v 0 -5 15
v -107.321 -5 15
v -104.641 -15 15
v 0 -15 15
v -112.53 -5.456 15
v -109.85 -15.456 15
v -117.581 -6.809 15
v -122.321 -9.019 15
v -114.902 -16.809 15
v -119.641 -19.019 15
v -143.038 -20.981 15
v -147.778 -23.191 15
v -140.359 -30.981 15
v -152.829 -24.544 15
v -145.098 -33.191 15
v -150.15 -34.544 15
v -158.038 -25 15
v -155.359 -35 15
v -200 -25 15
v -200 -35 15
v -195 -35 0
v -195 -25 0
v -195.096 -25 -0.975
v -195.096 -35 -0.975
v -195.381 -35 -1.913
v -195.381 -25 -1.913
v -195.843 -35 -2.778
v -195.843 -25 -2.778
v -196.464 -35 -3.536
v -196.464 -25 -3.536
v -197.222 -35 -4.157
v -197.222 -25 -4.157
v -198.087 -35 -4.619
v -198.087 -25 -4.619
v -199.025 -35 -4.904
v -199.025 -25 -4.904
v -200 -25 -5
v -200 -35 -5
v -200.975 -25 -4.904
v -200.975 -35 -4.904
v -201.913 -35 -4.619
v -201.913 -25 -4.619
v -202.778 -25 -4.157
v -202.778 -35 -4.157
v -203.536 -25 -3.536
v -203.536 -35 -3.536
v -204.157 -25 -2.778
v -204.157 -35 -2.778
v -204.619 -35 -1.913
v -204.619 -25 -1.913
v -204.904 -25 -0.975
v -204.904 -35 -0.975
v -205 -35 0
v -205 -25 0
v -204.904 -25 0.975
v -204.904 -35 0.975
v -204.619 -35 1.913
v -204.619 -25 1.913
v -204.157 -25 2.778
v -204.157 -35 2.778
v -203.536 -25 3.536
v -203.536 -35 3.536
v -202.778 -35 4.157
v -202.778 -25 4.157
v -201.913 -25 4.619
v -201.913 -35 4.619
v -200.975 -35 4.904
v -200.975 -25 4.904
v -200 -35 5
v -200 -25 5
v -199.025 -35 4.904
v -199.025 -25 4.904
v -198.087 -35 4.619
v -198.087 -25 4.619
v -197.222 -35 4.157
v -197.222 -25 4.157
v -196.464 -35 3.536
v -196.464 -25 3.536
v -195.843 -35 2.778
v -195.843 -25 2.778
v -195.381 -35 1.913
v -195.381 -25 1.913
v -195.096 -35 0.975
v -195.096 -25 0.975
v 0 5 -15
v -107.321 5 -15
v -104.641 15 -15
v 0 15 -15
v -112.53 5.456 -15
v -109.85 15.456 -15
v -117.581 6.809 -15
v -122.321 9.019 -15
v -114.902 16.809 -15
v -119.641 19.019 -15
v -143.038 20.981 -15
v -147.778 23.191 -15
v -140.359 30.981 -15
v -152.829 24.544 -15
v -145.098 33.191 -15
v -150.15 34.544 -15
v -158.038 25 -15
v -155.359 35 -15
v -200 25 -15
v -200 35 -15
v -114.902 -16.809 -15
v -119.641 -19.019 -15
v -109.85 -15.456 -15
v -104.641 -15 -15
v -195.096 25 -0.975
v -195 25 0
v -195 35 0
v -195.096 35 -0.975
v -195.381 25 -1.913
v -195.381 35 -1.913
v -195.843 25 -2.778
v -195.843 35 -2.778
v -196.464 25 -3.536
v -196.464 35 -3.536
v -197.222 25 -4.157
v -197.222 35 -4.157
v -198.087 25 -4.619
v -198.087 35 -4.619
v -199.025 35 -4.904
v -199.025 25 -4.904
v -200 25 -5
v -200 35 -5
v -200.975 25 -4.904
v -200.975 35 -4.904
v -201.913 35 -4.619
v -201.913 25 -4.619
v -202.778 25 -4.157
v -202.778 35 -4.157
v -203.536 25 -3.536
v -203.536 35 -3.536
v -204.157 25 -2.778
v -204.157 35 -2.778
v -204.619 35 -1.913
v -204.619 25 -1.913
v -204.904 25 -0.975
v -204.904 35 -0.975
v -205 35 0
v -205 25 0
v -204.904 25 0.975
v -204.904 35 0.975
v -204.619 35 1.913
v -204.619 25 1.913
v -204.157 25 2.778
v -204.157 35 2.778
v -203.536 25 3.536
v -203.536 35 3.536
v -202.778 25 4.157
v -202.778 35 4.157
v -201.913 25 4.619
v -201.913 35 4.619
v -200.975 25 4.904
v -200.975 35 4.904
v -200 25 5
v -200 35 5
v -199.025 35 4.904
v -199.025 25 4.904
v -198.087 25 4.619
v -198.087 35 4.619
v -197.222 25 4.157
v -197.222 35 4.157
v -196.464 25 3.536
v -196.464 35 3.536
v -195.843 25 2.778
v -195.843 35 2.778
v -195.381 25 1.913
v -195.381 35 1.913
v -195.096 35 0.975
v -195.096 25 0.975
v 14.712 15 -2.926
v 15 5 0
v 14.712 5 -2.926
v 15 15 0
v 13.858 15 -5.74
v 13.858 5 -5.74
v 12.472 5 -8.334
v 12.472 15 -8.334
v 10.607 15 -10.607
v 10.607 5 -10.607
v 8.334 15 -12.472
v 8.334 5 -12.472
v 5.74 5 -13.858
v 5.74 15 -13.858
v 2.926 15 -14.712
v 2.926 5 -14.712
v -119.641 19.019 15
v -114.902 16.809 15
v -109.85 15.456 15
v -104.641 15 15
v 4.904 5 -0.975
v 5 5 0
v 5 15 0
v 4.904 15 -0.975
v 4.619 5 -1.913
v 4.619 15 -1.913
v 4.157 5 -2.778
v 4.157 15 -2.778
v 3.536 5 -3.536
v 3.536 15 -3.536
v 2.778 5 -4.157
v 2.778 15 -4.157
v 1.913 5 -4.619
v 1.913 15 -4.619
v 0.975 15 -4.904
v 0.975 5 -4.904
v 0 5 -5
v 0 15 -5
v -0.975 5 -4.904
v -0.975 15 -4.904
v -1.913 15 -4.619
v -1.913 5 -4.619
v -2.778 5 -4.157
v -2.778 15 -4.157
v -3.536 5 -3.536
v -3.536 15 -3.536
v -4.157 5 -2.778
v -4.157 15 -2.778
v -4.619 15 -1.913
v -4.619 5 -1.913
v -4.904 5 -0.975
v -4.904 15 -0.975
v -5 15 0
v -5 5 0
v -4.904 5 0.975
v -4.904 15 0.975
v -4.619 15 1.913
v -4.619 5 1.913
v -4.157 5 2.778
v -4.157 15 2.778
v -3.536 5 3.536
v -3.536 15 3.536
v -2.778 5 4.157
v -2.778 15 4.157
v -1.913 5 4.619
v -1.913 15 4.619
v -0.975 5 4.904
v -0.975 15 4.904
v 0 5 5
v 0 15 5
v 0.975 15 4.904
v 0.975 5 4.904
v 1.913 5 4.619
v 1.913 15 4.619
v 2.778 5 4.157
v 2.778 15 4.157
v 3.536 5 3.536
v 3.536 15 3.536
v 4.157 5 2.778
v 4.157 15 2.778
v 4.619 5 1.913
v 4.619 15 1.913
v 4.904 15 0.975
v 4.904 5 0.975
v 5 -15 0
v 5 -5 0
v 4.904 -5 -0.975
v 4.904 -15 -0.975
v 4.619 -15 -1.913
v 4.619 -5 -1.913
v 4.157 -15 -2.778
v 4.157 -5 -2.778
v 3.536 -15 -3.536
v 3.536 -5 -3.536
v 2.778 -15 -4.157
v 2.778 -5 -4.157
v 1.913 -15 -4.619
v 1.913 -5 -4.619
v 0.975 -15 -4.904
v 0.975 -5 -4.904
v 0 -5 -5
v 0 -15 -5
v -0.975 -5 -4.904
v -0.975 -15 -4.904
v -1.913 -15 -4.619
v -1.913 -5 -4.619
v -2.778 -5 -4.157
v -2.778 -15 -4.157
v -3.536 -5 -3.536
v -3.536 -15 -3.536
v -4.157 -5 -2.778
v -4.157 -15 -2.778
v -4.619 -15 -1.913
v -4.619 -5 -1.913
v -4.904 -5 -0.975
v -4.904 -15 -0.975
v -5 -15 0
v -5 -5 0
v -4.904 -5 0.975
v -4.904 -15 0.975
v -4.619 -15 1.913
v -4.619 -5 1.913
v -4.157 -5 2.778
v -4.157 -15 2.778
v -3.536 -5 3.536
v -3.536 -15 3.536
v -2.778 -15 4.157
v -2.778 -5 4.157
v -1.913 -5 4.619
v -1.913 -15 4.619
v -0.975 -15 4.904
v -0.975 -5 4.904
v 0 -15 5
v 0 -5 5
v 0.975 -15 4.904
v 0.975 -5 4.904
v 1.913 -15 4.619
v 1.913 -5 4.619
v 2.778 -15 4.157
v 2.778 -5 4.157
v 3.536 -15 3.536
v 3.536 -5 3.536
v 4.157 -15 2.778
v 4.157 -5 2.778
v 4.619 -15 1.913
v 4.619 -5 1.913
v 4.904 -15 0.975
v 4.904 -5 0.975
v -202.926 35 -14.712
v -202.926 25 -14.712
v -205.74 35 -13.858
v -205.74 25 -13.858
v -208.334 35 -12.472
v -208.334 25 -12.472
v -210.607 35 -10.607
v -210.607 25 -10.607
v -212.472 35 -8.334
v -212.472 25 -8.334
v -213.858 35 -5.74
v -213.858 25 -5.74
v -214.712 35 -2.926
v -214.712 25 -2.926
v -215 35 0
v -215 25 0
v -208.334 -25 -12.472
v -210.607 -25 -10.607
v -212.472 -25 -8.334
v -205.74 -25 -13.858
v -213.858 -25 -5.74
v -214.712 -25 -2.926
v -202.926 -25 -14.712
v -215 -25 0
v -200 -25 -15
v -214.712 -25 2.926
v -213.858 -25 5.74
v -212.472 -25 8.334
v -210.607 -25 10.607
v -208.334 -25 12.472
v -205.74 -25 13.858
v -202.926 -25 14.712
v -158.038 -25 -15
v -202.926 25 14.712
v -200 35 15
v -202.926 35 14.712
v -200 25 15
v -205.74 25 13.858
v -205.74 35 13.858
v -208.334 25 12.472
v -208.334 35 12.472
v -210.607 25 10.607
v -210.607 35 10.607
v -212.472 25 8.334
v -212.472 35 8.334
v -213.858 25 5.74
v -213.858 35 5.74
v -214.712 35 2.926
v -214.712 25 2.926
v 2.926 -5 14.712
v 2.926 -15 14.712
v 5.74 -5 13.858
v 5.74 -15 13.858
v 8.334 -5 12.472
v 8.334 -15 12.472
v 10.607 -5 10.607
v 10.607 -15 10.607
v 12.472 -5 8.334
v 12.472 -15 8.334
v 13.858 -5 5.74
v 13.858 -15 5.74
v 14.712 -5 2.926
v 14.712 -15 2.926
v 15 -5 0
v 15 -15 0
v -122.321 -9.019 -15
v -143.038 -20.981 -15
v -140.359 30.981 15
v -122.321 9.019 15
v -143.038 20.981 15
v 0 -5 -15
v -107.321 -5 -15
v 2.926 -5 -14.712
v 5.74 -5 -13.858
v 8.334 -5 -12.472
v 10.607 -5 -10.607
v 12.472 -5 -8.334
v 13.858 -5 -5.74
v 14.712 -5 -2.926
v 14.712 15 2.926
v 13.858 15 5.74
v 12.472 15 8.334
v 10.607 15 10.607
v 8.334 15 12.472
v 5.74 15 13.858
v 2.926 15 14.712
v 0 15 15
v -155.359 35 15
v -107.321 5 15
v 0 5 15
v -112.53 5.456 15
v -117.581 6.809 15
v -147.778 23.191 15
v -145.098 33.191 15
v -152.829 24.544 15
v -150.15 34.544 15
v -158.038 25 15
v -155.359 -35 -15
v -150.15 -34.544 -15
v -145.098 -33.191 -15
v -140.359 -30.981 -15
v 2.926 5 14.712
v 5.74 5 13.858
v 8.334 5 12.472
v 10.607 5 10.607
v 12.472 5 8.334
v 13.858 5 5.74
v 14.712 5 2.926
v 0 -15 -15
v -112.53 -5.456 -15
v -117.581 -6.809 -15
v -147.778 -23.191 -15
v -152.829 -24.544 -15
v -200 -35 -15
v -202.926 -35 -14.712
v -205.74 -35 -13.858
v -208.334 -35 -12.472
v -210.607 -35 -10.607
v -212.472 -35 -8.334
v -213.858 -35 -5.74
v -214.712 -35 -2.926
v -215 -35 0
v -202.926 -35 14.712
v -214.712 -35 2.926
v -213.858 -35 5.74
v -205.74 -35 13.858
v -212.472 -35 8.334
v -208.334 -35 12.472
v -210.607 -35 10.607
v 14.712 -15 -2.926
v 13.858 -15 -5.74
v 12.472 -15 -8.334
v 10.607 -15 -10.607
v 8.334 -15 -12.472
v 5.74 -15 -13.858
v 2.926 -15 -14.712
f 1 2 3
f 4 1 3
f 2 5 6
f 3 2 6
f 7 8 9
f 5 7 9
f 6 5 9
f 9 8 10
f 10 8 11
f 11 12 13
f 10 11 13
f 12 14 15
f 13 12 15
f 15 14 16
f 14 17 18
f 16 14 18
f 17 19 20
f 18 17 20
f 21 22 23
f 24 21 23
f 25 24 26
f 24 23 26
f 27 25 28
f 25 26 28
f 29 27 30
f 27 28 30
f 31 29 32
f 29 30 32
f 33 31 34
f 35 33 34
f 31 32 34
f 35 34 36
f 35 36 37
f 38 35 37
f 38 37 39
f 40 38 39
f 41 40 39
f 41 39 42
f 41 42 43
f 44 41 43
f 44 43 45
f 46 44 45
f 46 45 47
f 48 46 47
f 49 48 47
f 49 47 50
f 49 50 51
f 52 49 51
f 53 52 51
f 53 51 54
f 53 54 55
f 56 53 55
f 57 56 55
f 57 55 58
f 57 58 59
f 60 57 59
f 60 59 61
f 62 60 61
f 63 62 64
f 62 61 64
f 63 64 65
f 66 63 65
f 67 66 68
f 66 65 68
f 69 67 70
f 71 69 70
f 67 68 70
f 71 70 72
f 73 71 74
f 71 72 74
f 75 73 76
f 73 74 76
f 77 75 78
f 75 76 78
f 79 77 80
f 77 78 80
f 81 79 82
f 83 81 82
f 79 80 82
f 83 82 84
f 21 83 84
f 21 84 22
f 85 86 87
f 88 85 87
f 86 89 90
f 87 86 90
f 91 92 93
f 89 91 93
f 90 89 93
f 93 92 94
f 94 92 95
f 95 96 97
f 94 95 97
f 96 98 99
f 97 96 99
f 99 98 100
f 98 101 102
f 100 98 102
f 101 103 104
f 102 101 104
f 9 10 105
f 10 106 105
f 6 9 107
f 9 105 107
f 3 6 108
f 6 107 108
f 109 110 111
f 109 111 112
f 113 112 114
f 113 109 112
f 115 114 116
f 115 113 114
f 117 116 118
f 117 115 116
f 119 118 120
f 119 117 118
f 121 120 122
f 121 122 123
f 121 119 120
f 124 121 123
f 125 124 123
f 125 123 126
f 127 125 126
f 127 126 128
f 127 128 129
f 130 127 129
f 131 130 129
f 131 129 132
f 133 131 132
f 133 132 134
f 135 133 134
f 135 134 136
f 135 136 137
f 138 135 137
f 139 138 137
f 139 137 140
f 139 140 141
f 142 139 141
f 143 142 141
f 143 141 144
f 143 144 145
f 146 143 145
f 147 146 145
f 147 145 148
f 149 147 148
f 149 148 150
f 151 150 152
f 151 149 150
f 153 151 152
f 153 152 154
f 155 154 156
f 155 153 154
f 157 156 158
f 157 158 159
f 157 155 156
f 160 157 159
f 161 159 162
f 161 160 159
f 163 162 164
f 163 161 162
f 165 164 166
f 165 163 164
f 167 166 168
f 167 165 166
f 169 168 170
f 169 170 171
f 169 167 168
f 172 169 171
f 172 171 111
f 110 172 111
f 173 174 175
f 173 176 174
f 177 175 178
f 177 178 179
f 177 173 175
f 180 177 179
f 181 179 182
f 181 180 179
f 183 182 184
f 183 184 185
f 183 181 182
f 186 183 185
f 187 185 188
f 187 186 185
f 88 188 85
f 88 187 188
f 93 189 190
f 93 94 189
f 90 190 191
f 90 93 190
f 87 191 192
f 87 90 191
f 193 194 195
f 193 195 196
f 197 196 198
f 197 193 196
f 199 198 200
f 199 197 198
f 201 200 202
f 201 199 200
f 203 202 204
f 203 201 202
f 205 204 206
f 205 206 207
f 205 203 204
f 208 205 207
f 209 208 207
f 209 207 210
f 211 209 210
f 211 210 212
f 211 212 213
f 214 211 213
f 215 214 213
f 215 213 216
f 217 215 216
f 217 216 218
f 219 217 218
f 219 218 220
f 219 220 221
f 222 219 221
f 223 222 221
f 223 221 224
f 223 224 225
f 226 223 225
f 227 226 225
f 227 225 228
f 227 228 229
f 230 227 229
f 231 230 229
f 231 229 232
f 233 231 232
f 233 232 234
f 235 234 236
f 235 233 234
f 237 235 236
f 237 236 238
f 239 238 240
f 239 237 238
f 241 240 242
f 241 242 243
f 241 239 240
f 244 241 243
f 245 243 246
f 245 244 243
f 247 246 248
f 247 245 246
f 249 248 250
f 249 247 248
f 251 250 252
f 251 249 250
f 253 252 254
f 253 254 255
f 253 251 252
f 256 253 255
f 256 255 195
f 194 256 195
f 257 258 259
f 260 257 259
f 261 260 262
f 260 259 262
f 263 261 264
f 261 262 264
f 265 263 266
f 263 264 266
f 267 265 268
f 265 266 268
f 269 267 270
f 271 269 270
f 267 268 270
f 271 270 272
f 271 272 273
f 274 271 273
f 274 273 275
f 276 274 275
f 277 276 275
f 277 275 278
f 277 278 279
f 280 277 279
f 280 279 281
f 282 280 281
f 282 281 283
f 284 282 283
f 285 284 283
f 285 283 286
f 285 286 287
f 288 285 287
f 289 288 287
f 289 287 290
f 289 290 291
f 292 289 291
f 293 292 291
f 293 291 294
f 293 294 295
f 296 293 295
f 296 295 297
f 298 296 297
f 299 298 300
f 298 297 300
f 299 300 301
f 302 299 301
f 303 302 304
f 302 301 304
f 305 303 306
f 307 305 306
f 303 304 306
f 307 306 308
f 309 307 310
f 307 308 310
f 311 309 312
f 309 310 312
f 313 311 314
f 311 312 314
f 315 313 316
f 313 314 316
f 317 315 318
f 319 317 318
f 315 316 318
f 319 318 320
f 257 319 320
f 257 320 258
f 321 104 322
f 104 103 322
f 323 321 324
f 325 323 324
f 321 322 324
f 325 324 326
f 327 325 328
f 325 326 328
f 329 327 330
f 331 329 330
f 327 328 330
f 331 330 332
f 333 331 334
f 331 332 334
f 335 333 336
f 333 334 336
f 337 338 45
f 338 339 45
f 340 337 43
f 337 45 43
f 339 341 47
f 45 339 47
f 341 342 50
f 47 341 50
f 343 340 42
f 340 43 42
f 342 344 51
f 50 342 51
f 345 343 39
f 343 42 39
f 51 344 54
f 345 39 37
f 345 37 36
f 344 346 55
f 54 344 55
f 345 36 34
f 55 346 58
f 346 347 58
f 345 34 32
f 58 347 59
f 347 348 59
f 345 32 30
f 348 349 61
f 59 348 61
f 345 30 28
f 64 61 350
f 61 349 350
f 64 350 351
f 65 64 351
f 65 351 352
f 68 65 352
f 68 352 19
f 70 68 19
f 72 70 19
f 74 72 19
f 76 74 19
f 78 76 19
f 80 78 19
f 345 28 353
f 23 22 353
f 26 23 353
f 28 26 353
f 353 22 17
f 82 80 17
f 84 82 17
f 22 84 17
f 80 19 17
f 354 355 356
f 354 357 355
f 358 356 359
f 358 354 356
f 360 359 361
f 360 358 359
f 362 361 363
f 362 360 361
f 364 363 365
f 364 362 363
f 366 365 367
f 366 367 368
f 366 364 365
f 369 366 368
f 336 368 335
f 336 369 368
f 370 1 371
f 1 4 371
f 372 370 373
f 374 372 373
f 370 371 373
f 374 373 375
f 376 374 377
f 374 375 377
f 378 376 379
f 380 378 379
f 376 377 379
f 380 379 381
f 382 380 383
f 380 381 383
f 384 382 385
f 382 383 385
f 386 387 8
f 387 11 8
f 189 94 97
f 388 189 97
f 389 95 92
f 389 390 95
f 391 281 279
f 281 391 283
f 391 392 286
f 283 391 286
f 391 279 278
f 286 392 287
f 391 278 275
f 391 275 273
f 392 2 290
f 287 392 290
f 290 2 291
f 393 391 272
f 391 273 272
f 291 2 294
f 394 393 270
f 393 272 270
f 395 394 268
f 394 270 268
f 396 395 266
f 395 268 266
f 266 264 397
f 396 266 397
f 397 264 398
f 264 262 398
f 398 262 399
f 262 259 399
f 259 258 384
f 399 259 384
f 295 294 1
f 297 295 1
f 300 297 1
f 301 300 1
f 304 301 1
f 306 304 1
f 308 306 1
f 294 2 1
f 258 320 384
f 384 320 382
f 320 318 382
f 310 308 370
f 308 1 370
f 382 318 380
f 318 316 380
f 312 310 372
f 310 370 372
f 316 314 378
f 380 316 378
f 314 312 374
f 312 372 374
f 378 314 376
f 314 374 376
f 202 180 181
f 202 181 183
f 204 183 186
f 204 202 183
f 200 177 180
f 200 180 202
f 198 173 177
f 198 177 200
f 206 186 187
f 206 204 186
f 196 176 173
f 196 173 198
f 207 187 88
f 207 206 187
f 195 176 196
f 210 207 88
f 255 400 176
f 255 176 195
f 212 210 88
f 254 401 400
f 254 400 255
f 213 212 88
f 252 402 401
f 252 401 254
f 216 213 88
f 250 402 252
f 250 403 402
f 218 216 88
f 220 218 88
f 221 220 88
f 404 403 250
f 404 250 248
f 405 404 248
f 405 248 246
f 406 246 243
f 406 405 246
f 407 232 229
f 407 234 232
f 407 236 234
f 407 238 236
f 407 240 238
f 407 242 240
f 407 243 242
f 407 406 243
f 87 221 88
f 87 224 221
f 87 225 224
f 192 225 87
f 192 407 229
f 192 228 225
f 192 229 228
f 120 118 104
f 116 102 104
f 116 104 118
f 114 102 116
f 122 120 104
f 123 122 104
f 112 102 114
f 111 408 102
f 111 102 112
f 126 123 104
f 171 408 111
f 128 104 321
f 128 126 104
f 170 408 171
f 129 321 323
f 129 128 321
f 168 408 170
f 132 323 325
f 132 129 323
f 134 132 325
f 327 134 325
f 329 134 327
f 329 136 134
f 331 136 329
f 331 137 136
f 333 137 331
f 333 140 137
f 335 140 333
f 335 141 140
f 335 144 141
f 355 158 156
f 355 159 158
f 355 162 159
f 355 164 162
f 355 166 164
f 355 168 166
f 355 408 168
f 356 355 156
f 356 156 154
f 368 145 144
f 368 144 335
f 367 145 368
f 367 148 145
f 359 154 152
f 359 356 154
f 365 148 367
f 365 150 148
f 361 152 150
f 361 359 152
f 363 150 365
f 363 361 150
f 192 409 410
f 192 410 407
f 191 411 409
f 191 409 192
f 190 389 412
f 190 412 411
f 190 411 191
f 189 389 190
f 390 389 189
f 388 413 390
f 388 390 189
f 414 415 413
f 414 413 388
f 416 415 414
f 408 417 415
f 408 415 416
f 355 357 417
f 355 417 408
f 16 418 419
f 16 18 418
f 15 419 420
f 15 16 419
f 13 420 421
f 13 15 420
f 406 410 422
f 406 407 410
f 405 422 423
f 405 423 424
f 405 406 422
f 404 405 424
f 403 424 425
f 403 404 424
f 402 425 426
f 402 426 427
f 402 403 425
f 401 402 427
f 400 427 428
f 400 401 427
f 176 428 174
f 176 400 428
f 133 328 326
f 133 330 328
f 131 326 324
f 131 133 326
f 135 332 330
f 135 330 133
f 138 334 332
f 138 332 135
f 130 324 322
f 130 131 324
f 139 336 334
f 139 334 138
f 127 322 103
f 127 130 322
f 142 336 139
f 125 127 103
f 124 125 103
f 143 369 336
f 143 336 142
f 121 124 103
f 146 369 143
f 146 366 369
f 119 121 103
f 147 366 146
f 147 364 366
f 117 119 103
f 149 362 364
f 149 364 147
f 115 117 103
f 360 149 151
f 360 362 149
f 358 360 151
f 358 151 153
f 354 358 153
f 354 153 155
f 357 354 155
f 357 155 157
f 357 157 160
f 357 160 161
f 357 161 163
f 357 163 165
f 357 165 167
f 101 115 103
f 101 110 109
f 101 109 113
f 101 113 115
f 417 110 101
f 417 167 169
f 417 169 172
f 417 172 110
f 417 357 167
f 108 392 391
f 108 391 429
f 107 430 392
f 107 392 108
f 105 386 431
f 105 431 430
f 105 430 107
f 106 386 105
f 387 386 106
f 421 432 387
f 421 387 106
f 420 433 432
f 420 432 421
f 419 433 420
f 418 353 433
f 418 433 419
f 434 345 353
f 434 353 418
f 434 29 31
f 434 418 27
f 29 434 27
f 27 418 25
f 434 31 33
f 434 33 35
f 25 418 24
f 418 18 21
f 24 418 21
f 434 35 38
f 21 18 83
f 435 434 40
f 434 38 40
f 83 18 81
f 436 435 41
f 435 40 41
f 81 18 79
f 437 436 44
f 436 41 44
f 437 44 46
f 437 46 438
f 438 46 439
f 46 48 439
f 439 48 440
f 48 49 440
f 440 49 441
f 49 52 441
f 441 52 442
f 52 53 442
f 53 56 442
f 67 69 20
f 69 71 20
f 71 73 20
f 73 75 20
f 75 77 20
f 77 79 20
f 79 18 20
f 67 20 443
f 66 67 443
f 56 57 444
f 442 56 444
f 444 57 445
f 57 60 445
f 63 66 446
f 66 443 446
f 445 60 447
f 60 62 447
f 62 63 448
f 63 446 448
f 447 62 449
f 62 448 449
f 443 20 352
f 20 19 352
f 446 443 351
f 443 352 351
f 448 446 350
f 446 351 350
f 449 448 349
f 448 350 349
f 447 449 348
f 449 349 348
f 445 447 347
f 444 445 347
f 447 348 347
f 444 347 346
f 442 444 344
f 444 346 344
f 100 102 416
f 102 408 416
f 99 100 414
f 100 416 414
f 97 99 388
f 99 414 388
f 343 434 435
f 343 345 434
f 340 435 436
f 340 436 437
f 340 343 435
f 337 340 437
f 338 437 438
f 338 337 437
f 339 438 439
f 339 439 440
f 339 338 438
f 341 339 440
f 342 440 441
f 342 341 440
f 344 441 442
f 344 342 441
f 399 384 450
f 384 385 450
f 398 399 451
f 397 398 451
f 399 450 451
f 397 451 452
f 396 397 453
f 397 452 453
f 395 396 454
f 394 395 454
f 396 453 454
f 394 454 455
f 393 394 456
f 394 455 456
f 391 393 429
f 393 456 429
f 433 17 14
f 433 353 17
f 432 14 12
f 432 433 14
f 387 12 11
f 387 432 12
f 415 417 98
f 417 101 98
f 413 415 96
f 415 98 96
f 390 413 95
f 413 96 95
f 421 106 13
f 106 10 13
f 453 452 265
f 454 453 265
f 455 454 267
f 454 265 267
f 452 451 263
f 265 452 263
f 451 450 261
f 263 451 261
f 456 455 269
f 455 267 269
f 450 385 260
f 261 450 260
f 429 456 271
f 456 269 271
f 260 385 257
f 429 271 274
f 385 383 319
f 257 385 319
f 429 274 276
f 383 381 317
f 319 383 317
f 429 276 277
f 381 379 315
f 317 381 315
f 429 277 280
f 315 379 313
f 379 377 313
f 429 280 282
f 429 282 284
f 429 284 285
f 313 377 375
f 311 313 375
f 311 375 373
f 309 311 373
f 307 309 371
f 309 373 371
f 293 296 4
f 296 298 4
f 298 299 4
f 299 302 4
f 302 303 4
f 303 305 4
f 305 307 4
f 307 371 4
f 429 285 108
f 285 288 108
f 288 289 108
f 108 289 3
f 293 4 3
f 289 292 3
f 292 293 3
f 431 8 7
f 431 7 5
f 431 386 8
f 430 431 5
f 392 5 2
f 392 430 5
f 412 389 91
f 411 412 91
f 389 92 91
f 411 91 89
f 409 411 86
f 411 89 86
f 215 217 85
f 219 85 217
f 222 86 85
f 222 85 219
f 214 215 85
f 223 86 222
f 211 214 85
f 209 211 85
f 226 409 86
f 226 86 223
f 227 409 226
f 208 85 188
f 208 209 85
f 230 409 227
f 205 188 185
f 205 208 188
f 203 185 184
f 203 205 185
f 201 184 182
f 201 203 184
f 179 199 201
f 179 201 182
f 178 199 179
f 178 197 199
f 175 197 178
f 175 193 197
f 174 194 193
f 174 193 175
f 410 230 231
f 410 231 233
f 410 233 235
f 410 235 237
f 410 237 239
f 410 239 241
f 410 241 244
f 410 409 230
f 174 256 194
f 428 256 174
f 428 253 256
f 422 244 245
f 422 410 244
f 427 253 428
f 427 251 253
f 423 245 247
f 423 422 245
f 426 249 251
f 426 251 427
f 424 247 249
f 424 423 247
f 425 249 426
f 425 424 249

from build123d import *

# Parameters (mm, degrees)
SALIENTE_EXTRUIR1_DEPTH = 15
REDONDEO3_R             = 15
REDONDEO2_R             = 30
CORTAR_EXTRUIR1_REACH   = 220.346
CROQUIS4_R              = 5


with BuildPart() as part:
    # Croquis3 → Saliente-Extruir1 (new, symmetric)
    with BuildSketch(Plane(origin=(0, 0, 0), x_dir=(0, 1, 0), z_dir=(0, 0, 1))):
        Polygon((-25, 215), (-25, 150), (-5, 115.358983849), (-5, -15), (-15, -15), (-15, 112.679491924), (-35, 147.320508076), (-35, 215), align=None)
    extrude(amount=SALIENTE_EXTRUIR1_DEPTH, both=True)

    # Redondeo3
    redondeo3_edges = [part.edges().sort_by_distance(p)[0] for p in [
        (15, -10, 15),
        (15, -10, -15),
        (-215, -30, -15),
        (-215, -30, 15),
    ]]
    fillet(redondeo3_edges, radius=REDONDEO3_R - 0.0001)  # a hair under: the kernel refuses the full size

    # Redondeo2
    redondeo2_edges = [part.edges().sort_by_distance(p)[0] for p in [
        (-150, -25, 0),
        (-115.358983849, -5, 0),
        (-112.679491924, -15, 0),
        (-147.320508076, -35, 0),
    ]]
    fillet(redondeo2_edges, radius=REDONDEO2_R)

    # Croquis4 → Cortar-Extruir1 (cut, up to next)
    with BuildSketch(Plane(origin=(0, 0, 0), x_dir=(-1, 0, 0), z_dir=(0, 1, 0)), mode=Mode.PRIVATE) as cortar_extruir1_sk1:
        with Locations(Location((0, 0, 0), (0, 0, 180))):
            Circle(CROQUIS4_R)
    cortar_extruir1_tool1 = extrude(cortar_extruir1_sk1.sketch, amount=-CORTAR_EXTRUIR1_REACH, mode=Mode.PRIVATE) & part.part
    # Croquis4 → Cortar-Extruir1 (cut, up to next)
    with BuildSketch(Plane(origin=(0, 0, 0), x_dir=(-1, 0, 0), z_dir=(0, 1, 0)), mode=Mode.PRIVATE) as cortar_extruir1_sk2:
        with Locations(Location((200, 0, 0), (0, 0, 180))):
            Circle(CROQUIS4_R)
    cortar_extruir1_tool2 = extrude(cortar_extruir1_sk2.sketch, amount=-CORTAR_EXTRUIR1_REACH, mode=Mode.PRIVATE) & part.part
    add(cortar_extruir1_tool1.solids().sort_by_distance((0, 0, 0))[0], mode=Mode.SUBTRACT)
    add(cortar_extruir1_tool2.solids().sort_by_distance((-200, 0, 0))[0], mode=Mode.SUBTRACT)


with BuildPart() as body_2:
    # Simetría2: mirrored copy
    add(part.part.mirror(Plane.ZX))


solid = Compound([part.part, body_2.part])
